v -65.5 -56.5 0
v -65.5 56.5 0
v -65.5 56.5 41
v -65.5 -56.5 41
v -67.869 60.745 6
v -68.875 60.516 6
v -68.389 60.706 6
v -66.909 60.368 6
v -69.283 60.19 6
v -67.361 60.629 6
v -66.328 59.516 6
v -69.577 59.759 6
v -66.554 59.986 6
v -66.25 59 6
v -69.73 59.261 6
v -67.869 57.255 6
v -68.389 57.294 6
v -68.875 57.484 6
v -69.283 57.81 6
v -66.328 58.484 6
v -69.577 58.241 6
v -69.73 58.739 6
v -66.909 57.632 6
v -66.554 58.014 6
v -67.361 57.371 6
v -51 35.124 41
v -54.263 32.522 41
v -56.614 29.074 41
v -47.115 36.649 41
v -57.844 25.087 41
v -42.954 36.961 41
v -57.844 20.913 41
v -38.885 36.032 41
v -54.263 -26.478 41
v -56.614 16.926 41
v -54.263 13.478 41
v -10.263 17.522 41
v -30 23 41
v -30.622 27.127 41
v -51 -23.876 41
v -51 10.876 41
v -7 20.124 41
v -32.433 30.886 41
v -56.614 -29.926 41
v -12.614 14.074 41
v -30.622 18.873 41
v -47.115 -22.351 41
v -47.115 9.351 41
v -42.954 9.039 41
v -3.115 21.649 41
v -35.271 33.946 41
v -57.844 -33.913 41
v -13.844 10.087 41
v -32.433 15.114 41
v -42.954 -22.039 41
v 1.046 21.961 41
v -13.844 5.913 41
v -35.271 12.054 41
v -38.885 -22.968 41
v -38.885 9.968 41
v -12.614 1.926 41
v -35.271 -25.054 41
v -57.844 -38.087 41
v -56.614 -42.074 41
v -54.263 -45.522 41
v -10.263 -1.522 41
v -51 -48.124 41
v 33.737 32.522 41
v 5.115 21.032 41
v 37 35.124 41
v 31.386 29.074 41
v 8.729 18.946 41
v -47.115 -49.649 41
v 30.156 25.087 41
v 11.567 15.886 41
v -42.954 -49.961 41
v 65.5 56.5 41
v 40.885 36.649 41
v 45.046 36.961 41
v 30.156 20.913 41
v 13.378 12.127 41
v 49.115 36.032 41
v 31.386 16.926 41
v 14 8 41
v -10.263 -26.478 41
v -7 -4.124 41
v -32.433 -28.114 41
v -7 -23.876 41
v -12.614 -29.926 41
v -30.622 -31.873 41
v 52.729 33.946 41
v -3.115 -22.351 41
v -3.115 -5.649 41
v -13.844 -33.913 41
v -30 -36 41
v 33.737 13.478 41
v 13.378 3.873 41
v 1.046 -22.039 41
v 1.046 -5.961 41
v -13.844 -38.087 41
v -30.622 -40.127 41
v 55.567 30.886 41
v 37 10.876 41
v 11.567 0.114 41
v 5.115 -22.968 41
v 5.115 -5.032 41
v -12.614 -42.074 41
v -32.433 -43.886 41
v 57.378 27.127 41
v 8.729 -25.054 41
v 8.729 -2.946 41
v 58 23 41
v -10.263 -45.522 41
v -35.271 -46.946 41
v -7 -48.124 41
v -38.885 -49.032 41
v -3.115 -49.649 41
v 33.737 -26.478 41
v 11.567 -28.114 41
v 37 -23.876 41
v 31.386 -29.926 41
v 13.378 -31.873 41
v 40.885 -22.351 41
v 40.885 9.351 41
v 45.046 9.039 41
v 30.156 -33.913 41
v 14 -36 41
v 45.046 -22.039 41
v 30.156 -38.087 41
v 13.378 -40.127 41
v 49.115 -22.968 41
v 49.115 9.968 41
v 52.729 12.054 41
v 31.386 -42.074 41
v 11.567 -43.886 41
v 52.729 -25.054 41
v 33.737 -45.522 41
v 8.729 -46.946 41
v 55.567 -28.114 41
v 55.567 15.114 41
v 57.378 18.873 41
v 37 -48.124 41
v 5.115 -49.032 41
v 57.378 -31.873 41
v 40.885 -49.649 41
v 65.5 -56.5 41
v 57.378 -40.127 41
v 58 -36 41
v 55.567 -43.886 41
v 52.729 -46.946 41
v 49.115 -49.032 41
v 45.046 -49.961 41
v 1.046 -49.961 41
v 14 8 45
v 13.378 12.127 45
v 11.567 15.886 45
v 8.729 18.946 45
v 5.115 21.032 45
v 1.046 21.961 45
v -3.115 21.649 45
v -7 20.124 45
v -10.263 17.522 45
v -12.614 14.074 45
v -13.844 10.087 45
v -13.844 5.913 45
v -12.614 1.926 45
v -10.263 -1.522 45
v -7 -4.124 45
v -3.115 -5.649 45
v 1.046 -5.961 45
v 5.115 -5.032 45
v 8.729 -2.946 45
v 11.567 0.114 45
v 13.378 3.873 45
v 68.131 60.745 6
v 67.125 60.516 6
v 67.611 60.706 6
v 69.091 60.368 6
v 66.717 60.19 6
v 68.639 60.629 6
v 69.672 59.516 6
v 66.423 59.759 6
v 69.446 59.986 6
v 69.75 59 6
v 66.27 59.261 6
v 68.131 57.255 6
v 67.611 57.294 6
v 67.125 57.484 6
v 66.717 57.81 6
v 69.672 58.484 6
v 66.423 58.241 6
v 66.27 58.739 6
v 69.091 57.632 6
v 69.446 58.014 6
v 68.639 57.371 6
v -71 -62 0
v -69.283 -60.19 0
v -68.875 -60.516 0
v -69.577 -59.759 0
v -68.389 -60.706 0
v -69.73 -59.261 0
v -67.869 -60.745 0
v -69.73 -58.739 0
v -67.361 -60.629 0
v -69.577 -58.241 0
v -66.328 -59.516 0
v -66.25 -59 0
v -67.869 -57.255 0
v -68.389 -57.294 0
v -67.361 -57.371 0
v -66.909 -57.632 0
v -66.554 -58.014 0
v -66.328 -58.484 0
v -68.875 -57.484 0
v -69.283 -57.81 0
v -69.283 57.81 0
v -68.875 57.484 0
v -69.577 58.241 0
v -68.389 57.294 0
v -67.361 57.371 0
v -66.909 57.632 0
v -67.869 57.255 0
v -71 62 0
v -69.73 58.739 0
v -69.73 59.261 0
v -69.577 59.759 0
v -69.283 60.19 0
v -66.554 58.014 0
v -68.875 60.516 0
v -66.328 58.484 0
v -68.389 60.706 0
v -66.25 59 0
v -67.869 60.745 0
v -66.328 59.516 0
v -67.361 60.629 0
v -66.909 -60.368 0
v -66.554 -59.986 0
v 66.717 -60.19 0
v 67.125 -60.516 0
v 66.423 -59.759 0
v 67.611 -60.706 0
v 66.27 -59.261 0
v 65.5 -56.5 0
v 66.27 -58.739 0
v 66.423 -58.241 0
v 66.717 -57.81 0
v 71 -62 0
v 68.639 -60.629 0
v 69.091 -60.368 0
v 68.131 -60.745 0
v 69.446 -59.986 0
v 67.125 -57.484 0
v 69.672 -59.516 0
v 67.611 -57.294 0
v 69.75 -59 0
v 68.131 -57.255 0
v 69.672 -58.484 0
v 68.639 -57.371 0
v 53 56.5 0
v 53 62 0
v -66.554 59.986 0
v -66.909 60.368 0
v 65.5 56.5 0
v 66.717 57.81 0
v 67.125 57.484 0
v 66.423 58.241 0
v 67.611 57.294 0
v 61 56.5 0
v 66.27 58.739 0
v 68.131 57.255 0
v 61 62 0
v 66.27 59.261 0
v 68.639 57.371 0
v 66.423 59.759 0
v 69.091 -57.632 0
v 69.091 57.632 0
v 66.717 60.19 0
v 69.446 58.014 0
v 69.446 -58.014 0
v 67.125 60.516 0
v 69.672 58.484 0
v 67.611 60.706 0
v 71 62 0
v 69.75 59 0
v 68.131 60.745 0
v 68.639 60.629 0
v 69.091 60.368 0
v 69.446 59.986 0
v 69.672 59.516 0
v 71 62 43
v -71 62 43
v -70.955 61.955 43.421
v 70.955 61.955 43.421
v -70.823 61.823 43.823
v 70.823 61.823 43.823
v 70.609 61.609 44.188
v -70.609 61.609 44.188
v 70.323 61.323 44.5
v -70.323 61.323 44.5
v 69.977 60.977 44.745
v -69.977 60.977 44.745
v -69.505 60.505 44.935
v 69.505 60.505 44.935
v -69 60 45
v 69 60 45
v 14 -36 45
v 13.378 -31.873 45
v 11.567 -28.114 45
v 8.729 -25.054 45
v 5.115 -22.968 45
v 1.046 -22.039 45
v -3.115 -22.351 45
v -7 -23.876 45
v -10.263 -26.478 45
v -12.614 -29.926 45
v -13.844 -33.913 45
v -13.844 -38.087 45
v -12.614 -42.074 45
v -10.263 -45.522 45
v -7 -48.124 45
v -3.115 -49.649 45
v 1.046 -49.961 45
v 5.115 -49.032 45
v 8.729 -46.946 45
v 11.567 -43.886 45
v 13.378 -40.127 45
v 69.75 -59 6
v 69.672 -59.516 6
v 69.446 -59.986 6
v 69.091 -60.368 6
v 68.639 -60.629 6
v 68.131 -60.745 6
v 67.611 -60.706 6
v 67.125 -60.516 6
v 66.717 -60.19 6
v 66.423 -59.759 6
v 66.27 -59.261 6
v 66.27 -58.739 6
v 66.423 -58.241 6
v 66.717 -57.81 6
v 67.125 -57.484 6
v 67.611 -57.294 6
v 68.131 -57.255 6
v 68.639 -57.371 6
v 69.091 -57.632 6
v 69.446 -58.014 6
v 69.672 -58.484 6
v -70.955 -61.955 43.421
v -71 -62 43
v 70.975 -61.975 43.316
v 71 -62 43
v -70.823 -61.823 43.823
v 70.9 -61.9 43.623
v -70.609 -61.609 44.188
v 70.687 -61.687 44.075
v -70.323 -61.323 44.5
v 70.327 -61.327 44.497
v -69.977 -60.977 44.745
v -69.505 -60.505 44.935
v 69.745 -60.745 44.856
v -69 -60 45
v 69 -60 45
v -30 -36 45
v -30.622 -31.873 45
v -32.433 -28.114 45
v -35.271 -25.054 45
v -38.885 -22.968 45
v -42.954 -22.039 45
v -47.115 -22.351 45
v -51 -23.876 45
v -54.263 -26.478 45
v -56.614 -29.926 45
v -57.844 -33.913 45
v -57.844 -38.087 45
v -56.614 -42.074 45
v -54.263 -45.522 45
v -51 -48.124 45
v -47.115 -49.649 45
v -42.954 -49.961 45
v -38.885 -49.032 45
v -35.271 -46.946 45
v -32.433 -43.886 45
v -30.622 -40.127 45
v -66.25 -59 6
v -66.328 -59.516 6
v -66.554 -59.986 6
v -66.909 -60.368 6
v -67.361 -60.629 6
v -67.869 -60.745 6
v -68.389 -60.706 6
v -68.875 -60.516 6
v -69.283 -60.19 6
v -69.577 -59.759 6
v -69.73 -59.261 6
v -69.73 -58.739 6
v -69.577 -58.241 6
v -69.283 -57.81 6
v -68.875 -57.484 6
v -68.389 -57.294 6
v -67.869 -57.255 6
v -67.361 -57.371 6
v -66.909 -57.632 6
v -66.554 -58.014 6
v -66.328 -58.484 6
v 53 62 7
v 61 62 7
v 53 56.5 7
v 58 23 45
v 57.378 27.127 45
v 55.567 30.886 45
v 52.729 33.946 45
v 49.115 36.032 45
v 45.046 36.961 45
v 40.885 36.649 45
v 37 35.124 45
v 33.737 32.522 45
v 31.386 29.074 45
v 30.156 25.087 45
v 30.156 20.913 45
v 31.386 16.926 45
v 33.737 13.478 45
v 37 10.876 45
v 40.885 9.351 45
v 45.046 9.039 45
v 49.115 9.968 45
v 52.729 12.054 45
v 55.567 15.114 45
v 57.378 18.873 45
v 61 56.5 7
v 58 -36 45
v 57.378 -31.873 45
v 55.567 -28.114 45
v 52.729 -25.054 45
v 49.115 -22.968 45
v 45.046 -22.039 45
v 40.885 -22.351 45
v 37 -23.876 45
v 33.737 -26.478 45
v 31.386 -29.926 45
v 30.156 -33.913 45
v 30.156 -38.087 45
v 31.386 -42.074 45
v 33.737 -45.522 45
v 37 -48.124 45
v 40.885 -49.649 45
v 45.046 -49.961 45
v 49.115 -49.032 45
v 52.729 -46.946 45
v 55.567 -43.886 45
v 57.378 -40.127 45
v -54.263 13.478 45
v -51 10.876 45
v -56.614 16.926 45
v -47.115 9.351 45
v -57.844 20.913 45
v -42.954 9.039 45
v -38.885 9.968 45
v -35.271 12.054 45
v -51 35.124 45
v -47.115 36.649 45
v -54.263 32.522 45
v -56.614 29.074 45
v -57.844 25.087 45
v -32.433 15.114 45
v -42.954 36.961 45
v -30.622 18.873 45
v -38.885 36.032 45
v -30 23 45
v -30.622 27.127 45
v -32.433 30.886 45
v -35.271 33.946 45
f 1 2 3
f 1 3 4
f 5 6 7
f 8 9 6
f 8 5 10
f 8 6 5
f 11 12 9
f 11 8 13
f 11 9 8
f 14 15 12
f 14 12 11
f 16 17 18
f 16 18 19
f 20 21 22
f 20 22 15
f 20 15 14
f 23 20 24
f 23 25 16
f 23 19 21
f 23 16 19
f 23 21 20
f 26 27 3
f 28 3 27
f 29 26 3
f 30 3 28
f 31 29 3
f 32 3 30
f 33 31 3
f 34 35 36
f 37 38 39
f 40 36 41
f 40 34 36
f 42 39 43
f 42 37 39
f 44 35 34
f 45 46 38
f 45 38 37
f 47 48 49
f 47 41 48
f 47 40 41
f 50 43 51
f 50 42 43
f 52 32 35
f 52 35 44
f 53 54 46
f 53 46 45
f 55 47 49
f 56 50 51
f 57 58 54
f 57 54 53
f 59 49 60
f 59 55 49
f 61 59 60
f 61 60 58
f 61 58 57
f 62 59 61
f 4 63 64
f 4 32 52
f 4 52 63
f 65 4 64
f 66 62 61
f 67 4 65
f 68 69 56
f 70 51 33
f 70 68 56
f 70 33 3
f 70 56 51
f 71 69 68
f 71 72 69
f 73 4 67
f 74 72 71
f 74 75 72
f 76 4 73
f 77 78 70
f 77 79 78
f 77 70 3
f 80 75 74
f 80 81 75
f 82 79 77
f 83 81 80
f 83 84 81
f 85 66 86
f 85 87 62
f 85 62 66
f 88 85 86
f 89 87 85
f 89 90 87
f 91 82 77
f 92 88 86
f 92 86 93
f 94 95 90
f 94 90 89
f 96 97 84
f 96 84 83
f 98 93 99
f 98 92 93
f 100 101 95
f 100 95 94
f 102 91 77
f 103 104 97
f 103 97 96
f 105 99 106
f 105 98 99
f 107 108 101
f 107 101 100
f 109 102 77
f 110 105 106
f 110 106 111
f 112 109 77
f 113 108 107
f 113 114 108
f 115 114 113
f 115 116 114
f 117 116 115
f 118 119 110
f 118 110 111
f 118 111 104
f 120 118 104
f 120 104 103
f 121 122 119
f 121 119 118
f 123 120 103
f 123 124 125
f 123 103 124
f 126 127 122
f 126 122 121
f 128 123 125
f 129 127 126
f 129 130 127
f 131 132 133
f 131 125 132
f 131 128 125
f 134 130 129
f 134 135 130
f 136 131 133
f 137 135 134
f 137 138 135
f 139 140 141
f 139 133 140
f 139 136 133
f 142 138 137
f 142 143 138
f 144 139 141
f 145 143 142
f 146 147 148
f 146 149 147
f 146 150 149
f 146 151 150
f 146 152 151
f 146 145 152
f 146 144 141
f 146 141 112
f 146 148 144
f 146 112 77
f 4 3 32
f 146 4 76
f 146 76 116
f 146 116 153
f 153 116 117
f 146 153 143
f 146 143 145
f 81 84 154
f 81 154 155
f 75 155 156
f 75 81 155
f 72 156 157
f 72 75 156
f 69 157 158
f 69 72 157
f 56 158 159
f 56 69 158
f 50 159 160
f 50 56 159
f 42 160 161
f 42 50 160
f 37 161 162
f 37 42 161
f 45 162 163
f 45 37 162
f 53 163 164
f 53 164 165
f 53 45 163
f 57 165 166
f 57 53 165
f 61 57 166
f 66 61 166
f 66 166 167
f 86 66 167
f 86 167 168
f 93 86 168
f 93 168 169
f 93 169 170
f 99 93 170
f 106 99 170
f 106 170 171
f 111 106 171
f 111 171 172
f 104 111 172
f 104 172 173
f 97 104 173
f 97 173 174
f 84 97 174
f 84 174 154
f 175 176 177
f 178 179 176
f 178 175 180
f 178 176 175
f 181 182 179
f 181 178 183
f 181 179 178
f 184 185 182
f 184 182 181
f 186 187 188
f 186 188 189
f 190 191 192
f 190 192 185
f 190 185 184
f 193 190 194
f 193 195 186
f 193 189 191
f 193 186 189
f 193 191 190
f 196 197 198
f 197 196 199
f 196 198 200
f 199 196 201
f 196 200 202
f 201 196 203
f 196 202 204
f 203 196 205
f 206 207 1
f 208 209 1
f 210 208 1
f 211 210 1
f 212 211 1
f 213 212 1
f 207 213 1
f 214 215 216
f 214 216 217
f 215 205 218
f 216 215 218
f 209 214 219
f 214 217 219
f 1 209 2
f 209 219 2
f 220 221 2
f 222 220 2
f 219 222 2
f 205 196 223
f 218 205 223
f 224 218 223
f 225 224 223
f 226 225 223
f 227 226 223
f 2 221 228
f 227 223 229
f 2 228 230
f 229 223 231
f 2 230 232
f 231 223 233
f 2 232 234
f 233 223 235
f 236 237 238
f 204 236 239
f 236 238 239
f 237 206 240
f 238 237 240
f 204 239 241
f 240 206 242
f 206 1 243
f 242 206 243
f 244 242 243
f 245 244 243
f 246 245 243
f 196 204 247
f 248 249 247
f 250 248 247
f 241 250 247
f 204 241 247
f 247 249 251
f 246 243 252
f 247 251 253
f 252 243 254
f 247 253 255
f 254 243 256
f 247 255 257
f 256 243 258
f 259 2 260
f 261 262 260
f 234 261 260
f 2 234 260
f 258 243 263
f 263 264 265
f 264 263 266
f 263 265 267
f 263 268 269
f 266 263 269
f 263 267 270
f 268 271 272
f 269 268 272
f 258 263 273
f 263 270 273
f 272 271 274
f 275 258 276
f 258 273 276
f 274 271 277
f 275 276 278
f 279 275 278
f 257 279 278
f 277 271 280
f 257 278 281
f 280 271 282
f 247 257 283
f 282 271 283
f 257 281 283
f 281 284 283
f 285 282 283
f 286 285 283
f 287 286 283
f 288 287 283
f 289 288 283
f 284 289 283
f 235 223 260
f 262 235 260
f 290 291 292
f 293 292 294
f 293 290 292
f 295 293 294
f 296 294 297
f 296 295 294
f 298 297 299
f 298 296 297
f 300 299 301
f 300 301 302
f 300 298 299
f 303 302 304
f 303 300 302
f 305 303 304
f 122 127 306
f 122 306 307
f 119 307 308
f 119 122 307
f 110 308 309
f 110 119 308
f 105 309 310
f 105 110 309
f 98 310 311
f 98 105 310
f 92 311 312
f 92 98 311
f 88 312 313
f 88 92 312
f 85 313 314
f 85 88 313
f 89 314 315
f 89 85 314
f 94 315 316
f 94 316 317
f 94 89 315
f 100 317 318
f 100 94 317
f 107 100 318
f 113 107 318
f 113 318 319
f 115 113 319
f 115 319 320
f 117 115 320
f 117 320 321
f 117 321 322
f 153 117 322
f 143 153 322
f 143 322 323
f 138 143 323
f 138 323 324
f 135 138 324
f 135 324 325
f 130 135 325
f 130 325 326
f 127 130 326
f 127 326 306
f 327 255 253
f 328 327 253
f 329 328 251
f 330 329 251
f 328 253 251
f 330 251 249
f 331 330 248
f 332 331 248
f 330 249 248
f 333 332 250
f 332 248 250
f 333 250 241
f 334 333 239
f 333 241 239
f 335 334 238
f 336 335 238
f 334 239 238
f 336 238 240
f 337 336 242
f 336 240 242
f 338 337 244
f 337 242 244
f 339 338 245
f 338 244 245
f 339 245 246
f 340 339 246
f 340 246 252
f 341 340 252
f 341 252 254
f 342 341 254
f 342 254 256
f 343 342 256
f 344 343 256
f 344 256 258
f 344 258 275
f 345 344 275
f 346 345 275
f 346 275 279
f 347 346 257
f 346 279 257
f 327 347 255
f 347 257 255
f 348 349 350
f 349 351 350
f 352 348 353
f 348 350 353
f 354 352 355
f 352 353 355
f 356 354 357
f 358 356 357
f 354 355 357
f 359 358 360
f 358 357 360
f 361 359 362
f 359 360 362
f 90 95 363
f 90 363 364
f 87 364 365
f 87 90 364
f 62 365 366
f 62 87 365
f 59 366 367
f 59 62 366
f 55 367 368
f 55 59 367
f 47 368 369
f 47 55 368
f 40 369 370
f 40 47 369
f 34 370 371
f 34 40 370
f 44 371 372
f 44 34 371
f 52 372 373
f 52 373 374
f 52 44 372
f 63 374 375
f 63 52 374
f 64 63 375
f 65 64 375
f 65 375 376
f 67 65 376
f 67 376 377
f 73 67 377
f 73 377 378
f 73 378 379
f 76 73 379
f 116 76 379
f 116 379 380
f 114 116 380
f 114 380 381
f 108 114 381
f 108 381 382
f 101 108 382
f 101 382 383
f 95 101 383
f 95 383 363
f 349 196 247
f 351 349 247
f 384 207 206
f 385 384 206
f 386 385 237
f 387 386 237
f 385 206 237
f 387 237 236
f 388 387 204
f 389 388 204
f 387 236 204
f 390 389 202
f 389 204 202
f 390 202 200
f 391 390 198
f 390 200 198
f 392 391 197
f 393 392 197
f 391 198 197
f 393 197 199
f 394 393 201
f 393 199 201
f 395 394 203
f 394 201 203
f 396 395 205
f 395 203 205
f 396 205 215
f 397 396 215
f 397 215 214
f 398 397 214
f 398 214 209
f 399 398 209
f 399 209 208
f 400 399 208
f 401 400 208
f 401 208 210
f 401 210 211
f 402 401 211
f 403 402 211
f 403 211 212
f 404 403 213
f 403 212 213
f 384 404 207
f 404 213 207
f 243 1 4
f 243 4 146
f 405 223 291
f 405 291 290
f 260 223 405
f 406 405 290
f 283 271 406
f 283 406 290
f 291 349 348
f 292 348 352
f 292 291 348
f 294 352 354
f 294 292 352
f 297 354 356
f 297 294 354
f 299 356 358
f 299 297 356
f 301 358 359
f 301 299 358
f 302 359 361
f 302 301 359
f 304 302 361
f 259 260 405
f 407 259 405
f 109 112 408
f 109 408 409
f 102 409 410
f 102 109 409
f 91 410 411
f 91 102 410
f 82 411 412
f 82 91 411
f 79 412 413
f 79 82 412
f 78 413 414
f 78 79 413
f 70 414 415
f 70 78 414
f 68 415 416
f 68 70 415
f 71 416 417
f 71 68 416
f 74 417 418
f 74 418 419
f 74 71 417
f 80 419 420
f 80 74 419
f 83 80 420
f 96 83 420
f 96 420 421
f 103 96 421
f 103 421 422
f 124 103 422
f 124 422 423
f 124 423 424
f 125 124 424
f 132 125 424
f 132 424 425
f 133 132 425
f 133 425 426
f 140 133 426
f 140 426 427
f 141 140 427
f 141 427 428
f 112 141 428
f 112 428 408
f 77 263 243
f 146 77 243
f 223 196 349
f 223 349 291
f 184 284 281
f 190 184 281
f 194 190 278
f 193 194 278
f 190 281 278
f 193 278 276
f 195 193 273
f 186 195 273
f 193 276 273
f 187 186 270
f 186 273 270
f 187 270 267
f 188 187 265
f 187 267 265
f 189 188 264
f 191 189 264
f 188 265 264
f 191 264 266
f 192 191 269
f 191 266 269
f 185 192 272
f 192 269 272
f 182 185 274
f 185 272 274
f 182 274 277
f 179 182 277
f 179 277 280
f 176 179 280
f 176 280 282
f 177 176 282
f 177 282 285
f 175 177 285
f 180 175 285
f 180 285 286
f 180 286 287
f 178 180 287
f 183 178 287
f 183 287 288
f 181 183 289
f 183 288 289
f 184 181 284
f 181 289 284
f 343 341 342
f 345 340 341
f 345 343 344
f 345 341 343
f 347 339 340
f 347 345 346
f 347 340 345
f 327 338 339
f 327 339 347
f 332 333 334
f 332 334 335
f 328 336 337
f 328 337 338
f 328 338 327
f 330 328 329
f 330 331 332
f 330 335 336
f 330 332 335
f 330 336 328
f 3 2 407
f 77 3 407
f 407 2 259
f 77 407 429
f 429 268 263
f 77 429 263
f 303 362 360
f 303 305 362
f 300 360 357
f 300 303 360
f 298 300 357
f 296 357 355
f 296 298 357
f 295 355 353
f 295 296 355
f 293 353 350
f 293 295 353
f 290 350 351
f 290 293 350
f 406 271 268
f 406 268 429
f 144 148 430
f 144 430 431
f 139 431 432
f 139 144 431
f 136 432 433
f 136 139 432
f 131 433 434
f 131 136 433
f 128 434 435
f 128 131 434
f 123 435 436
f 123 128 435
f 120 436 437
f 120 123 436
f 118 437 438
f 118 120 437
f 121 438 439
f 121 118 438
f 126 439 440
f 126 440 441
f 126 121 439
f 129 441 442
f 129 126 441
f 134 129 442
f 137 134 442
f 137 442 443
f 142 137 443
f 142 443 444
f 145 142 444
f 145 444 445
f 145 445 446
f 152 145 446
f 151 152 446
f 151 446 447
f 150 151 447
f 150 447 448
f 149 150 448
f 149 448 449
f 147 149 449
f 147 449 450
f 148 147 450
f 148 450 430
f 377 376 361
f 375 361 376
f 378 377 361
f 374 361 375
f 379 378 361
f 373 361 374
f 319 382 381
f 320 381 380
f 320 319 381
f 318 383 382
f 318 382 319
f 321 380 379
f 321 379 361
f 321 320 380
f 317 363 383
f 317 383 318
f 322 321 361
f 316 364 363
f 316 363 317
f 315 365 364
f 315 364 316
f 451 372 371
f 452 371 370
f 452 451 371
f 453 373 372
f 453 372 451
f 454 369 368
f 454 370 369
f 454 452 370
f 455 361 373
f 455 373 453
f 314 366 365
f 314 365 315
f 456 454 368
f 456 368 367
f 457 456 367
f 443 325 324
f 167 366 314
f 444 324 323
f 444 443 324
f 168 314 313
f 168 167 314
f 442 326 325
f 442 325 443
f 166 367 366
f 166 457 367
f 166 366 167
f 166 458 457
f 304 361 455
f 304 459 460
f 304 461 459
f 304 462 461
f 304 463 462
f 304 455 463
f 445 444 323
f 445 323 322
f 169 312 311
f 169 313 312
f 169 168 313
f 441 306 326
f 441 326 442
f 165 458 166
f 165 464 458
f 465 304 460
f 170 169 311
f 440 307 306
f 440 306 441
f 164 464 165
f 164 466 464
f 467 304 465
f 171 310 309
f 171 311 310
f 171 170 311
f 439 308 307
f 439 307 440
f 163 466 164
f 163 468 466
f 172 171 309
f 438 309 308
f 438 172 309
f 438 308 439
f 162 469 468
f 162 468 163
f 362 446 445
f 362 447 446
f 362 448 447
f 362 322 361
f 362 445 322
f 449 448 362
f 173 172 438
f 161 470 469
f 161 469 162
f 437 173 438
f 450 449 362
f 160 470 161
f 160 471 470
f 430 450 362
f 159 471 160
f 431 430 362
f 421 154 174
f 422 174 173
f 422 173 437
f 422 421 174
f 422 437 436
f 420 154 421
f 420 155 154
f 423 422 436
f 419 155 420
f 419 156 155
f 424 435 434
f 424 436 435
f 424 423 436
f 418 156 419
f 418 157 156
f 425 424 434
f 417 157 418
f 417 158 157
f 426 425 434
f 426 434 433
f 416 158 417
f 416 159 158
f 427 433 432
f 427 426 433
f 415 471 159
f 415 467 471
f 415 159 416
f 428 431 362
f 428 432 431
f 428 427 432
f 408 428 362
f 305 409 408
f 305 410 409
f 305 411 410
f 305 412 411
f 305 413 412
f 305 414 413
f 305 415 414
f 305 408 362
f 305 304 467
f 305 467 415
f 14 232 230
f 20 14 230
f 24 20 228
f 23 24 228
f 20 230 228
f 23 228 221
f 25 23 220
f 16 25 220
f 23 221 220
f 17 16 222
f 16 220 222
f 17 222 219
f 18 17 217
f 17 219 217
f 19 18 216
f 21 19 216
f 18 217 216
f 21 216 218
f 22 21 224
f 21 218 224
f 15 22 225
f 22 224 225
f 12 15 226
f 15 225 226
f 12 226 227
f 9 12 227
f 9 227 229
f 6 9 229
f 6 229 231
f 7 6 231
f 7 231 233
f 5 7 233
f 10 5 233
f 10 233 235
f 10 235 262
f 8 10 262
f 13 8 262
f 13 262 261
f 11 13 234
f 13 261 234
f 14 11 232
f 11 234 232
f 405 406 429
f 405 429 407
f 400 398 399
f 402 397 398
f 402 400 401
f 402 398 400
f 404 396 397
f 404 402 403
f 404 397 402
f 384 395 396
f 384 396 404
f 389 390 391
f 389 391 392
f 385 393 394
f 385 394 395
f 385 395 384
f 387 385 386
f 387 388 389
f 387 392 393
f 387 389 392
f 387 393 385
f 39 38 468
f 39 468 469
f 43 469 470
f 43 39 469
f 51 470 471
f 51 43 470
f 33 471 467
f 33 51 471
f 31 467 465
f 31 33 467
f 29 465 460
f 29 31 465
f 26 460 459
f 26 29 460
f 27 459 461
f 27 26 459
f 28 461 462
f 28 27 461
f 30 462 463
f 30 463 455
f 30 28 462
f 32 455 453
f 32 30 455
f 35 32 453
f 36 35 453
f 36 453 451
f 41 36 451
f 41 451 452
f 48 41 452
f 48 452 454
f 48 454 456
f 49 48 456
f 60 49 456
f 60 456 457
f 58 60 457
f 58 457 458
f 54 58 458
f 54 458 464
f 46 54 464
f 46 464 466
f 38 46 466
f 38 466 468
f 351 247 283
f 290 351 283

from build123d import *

# Parameters (mm, degrees)
SKETCH_W        = 142
SKETCH_H        = 124
SKETCH_R        = 14
PAD_DEPTH       = 45
SKETCH001_W     = 131
SKETCH001_H     = 113
POCKET_DEPTH    = 41
SKETCH002_R     = 1.75
POCKET001_DEPTH = 6
SKETCH003_W     = 8
SKETCH003_H     = 7
POCKET002_DEPTH = 10
FILLET_R        = 2


with BuildPart() as part:
    # Sketch → Pad (new body)
    with BuildSketch(Plane.XY):
        Rectangle(SKETCH_W, SKETCH_H)
        with Locations((0, 8)):
            Circle(SKETCH_R, mode=Mode.SUBTRACT)
        with Locations((0, -36)):
            Circle(SKETCH_R, mode=Mode.SUBTRACT)
        with Locations((44, -36)):
            Circle(SKETCH_R, mode=Mode.SUBTRACT)
        with Locations((-44, -36)):
            Circle(SKETCH_R, mode=Mode.SUBTRACT)
        with Locations((-44, 23)):
            Circle(SKETCH_R, mode=Mode.SUBTRACT)
        with Locations((44, 23)):
            Circle(SKETCH_R, mode=Mode.SUBTRACT)
    extrude(amount=PAD_DEPTH)

    # Sketch001 (on Face11 of Pad) → Pocket (cut)
    with BuildSketch(Plane(origin=(0, 0, 0), x_dir=(1, 0, 0), z_dir=(0, 0, -1))):
        Rectangle(SKETCH001_W, SKETCH001_H)
    extrude(amount=-POCKET_DEPTH, mode=Mode.SUBTRACT)

    # Sketch002 (on Face4 of Pocket) → Pocket001 (cut)
    with BuildSketch(Plane(origin=(0, 0, 0), x_dir=(1, 0, 0), z_dir=(0, 0, -1))):
        with Locations((-68, 59)):
            Circle(SKETCH002_R)
        with Locations((-68, -59)):
            Circle(SKETCH002_R)
        with Locations((68, -59)):
            Circle(SKETCH002_R)
        with Locations((68, 59)):
            Circle(SKETCH002_R)
    extrude(amount=-POCKET001_DEPTH, mode=Mode.SUBTRACT)

    # Sketch003 (on Face2 of Pocket001) → Pocket002 (cut)
    with BuildSketch(Plane(origin=(0, 62, 0), x_dir=(-1, 0, 0), z_dir=(0, 1, 0))):
        with Locations((-57, 3.5)):
            Rectangle(SKETCH003_W, SKETCH003_H)
    extrude(amount=-POCKET002_DEPTH, mode=Mode.SUBTRACT)

    # Fillet
    fillet_edges = [part.edges().sort_by_distance(p)[0] for p in [
        (-71, 0, 45),
        (0, 62, 45),
        (71, 0, 45),
        (0, -62, 45),
    ]]
    fillet(fillet_edges, radius=FILLET_R)


solid = part.part
